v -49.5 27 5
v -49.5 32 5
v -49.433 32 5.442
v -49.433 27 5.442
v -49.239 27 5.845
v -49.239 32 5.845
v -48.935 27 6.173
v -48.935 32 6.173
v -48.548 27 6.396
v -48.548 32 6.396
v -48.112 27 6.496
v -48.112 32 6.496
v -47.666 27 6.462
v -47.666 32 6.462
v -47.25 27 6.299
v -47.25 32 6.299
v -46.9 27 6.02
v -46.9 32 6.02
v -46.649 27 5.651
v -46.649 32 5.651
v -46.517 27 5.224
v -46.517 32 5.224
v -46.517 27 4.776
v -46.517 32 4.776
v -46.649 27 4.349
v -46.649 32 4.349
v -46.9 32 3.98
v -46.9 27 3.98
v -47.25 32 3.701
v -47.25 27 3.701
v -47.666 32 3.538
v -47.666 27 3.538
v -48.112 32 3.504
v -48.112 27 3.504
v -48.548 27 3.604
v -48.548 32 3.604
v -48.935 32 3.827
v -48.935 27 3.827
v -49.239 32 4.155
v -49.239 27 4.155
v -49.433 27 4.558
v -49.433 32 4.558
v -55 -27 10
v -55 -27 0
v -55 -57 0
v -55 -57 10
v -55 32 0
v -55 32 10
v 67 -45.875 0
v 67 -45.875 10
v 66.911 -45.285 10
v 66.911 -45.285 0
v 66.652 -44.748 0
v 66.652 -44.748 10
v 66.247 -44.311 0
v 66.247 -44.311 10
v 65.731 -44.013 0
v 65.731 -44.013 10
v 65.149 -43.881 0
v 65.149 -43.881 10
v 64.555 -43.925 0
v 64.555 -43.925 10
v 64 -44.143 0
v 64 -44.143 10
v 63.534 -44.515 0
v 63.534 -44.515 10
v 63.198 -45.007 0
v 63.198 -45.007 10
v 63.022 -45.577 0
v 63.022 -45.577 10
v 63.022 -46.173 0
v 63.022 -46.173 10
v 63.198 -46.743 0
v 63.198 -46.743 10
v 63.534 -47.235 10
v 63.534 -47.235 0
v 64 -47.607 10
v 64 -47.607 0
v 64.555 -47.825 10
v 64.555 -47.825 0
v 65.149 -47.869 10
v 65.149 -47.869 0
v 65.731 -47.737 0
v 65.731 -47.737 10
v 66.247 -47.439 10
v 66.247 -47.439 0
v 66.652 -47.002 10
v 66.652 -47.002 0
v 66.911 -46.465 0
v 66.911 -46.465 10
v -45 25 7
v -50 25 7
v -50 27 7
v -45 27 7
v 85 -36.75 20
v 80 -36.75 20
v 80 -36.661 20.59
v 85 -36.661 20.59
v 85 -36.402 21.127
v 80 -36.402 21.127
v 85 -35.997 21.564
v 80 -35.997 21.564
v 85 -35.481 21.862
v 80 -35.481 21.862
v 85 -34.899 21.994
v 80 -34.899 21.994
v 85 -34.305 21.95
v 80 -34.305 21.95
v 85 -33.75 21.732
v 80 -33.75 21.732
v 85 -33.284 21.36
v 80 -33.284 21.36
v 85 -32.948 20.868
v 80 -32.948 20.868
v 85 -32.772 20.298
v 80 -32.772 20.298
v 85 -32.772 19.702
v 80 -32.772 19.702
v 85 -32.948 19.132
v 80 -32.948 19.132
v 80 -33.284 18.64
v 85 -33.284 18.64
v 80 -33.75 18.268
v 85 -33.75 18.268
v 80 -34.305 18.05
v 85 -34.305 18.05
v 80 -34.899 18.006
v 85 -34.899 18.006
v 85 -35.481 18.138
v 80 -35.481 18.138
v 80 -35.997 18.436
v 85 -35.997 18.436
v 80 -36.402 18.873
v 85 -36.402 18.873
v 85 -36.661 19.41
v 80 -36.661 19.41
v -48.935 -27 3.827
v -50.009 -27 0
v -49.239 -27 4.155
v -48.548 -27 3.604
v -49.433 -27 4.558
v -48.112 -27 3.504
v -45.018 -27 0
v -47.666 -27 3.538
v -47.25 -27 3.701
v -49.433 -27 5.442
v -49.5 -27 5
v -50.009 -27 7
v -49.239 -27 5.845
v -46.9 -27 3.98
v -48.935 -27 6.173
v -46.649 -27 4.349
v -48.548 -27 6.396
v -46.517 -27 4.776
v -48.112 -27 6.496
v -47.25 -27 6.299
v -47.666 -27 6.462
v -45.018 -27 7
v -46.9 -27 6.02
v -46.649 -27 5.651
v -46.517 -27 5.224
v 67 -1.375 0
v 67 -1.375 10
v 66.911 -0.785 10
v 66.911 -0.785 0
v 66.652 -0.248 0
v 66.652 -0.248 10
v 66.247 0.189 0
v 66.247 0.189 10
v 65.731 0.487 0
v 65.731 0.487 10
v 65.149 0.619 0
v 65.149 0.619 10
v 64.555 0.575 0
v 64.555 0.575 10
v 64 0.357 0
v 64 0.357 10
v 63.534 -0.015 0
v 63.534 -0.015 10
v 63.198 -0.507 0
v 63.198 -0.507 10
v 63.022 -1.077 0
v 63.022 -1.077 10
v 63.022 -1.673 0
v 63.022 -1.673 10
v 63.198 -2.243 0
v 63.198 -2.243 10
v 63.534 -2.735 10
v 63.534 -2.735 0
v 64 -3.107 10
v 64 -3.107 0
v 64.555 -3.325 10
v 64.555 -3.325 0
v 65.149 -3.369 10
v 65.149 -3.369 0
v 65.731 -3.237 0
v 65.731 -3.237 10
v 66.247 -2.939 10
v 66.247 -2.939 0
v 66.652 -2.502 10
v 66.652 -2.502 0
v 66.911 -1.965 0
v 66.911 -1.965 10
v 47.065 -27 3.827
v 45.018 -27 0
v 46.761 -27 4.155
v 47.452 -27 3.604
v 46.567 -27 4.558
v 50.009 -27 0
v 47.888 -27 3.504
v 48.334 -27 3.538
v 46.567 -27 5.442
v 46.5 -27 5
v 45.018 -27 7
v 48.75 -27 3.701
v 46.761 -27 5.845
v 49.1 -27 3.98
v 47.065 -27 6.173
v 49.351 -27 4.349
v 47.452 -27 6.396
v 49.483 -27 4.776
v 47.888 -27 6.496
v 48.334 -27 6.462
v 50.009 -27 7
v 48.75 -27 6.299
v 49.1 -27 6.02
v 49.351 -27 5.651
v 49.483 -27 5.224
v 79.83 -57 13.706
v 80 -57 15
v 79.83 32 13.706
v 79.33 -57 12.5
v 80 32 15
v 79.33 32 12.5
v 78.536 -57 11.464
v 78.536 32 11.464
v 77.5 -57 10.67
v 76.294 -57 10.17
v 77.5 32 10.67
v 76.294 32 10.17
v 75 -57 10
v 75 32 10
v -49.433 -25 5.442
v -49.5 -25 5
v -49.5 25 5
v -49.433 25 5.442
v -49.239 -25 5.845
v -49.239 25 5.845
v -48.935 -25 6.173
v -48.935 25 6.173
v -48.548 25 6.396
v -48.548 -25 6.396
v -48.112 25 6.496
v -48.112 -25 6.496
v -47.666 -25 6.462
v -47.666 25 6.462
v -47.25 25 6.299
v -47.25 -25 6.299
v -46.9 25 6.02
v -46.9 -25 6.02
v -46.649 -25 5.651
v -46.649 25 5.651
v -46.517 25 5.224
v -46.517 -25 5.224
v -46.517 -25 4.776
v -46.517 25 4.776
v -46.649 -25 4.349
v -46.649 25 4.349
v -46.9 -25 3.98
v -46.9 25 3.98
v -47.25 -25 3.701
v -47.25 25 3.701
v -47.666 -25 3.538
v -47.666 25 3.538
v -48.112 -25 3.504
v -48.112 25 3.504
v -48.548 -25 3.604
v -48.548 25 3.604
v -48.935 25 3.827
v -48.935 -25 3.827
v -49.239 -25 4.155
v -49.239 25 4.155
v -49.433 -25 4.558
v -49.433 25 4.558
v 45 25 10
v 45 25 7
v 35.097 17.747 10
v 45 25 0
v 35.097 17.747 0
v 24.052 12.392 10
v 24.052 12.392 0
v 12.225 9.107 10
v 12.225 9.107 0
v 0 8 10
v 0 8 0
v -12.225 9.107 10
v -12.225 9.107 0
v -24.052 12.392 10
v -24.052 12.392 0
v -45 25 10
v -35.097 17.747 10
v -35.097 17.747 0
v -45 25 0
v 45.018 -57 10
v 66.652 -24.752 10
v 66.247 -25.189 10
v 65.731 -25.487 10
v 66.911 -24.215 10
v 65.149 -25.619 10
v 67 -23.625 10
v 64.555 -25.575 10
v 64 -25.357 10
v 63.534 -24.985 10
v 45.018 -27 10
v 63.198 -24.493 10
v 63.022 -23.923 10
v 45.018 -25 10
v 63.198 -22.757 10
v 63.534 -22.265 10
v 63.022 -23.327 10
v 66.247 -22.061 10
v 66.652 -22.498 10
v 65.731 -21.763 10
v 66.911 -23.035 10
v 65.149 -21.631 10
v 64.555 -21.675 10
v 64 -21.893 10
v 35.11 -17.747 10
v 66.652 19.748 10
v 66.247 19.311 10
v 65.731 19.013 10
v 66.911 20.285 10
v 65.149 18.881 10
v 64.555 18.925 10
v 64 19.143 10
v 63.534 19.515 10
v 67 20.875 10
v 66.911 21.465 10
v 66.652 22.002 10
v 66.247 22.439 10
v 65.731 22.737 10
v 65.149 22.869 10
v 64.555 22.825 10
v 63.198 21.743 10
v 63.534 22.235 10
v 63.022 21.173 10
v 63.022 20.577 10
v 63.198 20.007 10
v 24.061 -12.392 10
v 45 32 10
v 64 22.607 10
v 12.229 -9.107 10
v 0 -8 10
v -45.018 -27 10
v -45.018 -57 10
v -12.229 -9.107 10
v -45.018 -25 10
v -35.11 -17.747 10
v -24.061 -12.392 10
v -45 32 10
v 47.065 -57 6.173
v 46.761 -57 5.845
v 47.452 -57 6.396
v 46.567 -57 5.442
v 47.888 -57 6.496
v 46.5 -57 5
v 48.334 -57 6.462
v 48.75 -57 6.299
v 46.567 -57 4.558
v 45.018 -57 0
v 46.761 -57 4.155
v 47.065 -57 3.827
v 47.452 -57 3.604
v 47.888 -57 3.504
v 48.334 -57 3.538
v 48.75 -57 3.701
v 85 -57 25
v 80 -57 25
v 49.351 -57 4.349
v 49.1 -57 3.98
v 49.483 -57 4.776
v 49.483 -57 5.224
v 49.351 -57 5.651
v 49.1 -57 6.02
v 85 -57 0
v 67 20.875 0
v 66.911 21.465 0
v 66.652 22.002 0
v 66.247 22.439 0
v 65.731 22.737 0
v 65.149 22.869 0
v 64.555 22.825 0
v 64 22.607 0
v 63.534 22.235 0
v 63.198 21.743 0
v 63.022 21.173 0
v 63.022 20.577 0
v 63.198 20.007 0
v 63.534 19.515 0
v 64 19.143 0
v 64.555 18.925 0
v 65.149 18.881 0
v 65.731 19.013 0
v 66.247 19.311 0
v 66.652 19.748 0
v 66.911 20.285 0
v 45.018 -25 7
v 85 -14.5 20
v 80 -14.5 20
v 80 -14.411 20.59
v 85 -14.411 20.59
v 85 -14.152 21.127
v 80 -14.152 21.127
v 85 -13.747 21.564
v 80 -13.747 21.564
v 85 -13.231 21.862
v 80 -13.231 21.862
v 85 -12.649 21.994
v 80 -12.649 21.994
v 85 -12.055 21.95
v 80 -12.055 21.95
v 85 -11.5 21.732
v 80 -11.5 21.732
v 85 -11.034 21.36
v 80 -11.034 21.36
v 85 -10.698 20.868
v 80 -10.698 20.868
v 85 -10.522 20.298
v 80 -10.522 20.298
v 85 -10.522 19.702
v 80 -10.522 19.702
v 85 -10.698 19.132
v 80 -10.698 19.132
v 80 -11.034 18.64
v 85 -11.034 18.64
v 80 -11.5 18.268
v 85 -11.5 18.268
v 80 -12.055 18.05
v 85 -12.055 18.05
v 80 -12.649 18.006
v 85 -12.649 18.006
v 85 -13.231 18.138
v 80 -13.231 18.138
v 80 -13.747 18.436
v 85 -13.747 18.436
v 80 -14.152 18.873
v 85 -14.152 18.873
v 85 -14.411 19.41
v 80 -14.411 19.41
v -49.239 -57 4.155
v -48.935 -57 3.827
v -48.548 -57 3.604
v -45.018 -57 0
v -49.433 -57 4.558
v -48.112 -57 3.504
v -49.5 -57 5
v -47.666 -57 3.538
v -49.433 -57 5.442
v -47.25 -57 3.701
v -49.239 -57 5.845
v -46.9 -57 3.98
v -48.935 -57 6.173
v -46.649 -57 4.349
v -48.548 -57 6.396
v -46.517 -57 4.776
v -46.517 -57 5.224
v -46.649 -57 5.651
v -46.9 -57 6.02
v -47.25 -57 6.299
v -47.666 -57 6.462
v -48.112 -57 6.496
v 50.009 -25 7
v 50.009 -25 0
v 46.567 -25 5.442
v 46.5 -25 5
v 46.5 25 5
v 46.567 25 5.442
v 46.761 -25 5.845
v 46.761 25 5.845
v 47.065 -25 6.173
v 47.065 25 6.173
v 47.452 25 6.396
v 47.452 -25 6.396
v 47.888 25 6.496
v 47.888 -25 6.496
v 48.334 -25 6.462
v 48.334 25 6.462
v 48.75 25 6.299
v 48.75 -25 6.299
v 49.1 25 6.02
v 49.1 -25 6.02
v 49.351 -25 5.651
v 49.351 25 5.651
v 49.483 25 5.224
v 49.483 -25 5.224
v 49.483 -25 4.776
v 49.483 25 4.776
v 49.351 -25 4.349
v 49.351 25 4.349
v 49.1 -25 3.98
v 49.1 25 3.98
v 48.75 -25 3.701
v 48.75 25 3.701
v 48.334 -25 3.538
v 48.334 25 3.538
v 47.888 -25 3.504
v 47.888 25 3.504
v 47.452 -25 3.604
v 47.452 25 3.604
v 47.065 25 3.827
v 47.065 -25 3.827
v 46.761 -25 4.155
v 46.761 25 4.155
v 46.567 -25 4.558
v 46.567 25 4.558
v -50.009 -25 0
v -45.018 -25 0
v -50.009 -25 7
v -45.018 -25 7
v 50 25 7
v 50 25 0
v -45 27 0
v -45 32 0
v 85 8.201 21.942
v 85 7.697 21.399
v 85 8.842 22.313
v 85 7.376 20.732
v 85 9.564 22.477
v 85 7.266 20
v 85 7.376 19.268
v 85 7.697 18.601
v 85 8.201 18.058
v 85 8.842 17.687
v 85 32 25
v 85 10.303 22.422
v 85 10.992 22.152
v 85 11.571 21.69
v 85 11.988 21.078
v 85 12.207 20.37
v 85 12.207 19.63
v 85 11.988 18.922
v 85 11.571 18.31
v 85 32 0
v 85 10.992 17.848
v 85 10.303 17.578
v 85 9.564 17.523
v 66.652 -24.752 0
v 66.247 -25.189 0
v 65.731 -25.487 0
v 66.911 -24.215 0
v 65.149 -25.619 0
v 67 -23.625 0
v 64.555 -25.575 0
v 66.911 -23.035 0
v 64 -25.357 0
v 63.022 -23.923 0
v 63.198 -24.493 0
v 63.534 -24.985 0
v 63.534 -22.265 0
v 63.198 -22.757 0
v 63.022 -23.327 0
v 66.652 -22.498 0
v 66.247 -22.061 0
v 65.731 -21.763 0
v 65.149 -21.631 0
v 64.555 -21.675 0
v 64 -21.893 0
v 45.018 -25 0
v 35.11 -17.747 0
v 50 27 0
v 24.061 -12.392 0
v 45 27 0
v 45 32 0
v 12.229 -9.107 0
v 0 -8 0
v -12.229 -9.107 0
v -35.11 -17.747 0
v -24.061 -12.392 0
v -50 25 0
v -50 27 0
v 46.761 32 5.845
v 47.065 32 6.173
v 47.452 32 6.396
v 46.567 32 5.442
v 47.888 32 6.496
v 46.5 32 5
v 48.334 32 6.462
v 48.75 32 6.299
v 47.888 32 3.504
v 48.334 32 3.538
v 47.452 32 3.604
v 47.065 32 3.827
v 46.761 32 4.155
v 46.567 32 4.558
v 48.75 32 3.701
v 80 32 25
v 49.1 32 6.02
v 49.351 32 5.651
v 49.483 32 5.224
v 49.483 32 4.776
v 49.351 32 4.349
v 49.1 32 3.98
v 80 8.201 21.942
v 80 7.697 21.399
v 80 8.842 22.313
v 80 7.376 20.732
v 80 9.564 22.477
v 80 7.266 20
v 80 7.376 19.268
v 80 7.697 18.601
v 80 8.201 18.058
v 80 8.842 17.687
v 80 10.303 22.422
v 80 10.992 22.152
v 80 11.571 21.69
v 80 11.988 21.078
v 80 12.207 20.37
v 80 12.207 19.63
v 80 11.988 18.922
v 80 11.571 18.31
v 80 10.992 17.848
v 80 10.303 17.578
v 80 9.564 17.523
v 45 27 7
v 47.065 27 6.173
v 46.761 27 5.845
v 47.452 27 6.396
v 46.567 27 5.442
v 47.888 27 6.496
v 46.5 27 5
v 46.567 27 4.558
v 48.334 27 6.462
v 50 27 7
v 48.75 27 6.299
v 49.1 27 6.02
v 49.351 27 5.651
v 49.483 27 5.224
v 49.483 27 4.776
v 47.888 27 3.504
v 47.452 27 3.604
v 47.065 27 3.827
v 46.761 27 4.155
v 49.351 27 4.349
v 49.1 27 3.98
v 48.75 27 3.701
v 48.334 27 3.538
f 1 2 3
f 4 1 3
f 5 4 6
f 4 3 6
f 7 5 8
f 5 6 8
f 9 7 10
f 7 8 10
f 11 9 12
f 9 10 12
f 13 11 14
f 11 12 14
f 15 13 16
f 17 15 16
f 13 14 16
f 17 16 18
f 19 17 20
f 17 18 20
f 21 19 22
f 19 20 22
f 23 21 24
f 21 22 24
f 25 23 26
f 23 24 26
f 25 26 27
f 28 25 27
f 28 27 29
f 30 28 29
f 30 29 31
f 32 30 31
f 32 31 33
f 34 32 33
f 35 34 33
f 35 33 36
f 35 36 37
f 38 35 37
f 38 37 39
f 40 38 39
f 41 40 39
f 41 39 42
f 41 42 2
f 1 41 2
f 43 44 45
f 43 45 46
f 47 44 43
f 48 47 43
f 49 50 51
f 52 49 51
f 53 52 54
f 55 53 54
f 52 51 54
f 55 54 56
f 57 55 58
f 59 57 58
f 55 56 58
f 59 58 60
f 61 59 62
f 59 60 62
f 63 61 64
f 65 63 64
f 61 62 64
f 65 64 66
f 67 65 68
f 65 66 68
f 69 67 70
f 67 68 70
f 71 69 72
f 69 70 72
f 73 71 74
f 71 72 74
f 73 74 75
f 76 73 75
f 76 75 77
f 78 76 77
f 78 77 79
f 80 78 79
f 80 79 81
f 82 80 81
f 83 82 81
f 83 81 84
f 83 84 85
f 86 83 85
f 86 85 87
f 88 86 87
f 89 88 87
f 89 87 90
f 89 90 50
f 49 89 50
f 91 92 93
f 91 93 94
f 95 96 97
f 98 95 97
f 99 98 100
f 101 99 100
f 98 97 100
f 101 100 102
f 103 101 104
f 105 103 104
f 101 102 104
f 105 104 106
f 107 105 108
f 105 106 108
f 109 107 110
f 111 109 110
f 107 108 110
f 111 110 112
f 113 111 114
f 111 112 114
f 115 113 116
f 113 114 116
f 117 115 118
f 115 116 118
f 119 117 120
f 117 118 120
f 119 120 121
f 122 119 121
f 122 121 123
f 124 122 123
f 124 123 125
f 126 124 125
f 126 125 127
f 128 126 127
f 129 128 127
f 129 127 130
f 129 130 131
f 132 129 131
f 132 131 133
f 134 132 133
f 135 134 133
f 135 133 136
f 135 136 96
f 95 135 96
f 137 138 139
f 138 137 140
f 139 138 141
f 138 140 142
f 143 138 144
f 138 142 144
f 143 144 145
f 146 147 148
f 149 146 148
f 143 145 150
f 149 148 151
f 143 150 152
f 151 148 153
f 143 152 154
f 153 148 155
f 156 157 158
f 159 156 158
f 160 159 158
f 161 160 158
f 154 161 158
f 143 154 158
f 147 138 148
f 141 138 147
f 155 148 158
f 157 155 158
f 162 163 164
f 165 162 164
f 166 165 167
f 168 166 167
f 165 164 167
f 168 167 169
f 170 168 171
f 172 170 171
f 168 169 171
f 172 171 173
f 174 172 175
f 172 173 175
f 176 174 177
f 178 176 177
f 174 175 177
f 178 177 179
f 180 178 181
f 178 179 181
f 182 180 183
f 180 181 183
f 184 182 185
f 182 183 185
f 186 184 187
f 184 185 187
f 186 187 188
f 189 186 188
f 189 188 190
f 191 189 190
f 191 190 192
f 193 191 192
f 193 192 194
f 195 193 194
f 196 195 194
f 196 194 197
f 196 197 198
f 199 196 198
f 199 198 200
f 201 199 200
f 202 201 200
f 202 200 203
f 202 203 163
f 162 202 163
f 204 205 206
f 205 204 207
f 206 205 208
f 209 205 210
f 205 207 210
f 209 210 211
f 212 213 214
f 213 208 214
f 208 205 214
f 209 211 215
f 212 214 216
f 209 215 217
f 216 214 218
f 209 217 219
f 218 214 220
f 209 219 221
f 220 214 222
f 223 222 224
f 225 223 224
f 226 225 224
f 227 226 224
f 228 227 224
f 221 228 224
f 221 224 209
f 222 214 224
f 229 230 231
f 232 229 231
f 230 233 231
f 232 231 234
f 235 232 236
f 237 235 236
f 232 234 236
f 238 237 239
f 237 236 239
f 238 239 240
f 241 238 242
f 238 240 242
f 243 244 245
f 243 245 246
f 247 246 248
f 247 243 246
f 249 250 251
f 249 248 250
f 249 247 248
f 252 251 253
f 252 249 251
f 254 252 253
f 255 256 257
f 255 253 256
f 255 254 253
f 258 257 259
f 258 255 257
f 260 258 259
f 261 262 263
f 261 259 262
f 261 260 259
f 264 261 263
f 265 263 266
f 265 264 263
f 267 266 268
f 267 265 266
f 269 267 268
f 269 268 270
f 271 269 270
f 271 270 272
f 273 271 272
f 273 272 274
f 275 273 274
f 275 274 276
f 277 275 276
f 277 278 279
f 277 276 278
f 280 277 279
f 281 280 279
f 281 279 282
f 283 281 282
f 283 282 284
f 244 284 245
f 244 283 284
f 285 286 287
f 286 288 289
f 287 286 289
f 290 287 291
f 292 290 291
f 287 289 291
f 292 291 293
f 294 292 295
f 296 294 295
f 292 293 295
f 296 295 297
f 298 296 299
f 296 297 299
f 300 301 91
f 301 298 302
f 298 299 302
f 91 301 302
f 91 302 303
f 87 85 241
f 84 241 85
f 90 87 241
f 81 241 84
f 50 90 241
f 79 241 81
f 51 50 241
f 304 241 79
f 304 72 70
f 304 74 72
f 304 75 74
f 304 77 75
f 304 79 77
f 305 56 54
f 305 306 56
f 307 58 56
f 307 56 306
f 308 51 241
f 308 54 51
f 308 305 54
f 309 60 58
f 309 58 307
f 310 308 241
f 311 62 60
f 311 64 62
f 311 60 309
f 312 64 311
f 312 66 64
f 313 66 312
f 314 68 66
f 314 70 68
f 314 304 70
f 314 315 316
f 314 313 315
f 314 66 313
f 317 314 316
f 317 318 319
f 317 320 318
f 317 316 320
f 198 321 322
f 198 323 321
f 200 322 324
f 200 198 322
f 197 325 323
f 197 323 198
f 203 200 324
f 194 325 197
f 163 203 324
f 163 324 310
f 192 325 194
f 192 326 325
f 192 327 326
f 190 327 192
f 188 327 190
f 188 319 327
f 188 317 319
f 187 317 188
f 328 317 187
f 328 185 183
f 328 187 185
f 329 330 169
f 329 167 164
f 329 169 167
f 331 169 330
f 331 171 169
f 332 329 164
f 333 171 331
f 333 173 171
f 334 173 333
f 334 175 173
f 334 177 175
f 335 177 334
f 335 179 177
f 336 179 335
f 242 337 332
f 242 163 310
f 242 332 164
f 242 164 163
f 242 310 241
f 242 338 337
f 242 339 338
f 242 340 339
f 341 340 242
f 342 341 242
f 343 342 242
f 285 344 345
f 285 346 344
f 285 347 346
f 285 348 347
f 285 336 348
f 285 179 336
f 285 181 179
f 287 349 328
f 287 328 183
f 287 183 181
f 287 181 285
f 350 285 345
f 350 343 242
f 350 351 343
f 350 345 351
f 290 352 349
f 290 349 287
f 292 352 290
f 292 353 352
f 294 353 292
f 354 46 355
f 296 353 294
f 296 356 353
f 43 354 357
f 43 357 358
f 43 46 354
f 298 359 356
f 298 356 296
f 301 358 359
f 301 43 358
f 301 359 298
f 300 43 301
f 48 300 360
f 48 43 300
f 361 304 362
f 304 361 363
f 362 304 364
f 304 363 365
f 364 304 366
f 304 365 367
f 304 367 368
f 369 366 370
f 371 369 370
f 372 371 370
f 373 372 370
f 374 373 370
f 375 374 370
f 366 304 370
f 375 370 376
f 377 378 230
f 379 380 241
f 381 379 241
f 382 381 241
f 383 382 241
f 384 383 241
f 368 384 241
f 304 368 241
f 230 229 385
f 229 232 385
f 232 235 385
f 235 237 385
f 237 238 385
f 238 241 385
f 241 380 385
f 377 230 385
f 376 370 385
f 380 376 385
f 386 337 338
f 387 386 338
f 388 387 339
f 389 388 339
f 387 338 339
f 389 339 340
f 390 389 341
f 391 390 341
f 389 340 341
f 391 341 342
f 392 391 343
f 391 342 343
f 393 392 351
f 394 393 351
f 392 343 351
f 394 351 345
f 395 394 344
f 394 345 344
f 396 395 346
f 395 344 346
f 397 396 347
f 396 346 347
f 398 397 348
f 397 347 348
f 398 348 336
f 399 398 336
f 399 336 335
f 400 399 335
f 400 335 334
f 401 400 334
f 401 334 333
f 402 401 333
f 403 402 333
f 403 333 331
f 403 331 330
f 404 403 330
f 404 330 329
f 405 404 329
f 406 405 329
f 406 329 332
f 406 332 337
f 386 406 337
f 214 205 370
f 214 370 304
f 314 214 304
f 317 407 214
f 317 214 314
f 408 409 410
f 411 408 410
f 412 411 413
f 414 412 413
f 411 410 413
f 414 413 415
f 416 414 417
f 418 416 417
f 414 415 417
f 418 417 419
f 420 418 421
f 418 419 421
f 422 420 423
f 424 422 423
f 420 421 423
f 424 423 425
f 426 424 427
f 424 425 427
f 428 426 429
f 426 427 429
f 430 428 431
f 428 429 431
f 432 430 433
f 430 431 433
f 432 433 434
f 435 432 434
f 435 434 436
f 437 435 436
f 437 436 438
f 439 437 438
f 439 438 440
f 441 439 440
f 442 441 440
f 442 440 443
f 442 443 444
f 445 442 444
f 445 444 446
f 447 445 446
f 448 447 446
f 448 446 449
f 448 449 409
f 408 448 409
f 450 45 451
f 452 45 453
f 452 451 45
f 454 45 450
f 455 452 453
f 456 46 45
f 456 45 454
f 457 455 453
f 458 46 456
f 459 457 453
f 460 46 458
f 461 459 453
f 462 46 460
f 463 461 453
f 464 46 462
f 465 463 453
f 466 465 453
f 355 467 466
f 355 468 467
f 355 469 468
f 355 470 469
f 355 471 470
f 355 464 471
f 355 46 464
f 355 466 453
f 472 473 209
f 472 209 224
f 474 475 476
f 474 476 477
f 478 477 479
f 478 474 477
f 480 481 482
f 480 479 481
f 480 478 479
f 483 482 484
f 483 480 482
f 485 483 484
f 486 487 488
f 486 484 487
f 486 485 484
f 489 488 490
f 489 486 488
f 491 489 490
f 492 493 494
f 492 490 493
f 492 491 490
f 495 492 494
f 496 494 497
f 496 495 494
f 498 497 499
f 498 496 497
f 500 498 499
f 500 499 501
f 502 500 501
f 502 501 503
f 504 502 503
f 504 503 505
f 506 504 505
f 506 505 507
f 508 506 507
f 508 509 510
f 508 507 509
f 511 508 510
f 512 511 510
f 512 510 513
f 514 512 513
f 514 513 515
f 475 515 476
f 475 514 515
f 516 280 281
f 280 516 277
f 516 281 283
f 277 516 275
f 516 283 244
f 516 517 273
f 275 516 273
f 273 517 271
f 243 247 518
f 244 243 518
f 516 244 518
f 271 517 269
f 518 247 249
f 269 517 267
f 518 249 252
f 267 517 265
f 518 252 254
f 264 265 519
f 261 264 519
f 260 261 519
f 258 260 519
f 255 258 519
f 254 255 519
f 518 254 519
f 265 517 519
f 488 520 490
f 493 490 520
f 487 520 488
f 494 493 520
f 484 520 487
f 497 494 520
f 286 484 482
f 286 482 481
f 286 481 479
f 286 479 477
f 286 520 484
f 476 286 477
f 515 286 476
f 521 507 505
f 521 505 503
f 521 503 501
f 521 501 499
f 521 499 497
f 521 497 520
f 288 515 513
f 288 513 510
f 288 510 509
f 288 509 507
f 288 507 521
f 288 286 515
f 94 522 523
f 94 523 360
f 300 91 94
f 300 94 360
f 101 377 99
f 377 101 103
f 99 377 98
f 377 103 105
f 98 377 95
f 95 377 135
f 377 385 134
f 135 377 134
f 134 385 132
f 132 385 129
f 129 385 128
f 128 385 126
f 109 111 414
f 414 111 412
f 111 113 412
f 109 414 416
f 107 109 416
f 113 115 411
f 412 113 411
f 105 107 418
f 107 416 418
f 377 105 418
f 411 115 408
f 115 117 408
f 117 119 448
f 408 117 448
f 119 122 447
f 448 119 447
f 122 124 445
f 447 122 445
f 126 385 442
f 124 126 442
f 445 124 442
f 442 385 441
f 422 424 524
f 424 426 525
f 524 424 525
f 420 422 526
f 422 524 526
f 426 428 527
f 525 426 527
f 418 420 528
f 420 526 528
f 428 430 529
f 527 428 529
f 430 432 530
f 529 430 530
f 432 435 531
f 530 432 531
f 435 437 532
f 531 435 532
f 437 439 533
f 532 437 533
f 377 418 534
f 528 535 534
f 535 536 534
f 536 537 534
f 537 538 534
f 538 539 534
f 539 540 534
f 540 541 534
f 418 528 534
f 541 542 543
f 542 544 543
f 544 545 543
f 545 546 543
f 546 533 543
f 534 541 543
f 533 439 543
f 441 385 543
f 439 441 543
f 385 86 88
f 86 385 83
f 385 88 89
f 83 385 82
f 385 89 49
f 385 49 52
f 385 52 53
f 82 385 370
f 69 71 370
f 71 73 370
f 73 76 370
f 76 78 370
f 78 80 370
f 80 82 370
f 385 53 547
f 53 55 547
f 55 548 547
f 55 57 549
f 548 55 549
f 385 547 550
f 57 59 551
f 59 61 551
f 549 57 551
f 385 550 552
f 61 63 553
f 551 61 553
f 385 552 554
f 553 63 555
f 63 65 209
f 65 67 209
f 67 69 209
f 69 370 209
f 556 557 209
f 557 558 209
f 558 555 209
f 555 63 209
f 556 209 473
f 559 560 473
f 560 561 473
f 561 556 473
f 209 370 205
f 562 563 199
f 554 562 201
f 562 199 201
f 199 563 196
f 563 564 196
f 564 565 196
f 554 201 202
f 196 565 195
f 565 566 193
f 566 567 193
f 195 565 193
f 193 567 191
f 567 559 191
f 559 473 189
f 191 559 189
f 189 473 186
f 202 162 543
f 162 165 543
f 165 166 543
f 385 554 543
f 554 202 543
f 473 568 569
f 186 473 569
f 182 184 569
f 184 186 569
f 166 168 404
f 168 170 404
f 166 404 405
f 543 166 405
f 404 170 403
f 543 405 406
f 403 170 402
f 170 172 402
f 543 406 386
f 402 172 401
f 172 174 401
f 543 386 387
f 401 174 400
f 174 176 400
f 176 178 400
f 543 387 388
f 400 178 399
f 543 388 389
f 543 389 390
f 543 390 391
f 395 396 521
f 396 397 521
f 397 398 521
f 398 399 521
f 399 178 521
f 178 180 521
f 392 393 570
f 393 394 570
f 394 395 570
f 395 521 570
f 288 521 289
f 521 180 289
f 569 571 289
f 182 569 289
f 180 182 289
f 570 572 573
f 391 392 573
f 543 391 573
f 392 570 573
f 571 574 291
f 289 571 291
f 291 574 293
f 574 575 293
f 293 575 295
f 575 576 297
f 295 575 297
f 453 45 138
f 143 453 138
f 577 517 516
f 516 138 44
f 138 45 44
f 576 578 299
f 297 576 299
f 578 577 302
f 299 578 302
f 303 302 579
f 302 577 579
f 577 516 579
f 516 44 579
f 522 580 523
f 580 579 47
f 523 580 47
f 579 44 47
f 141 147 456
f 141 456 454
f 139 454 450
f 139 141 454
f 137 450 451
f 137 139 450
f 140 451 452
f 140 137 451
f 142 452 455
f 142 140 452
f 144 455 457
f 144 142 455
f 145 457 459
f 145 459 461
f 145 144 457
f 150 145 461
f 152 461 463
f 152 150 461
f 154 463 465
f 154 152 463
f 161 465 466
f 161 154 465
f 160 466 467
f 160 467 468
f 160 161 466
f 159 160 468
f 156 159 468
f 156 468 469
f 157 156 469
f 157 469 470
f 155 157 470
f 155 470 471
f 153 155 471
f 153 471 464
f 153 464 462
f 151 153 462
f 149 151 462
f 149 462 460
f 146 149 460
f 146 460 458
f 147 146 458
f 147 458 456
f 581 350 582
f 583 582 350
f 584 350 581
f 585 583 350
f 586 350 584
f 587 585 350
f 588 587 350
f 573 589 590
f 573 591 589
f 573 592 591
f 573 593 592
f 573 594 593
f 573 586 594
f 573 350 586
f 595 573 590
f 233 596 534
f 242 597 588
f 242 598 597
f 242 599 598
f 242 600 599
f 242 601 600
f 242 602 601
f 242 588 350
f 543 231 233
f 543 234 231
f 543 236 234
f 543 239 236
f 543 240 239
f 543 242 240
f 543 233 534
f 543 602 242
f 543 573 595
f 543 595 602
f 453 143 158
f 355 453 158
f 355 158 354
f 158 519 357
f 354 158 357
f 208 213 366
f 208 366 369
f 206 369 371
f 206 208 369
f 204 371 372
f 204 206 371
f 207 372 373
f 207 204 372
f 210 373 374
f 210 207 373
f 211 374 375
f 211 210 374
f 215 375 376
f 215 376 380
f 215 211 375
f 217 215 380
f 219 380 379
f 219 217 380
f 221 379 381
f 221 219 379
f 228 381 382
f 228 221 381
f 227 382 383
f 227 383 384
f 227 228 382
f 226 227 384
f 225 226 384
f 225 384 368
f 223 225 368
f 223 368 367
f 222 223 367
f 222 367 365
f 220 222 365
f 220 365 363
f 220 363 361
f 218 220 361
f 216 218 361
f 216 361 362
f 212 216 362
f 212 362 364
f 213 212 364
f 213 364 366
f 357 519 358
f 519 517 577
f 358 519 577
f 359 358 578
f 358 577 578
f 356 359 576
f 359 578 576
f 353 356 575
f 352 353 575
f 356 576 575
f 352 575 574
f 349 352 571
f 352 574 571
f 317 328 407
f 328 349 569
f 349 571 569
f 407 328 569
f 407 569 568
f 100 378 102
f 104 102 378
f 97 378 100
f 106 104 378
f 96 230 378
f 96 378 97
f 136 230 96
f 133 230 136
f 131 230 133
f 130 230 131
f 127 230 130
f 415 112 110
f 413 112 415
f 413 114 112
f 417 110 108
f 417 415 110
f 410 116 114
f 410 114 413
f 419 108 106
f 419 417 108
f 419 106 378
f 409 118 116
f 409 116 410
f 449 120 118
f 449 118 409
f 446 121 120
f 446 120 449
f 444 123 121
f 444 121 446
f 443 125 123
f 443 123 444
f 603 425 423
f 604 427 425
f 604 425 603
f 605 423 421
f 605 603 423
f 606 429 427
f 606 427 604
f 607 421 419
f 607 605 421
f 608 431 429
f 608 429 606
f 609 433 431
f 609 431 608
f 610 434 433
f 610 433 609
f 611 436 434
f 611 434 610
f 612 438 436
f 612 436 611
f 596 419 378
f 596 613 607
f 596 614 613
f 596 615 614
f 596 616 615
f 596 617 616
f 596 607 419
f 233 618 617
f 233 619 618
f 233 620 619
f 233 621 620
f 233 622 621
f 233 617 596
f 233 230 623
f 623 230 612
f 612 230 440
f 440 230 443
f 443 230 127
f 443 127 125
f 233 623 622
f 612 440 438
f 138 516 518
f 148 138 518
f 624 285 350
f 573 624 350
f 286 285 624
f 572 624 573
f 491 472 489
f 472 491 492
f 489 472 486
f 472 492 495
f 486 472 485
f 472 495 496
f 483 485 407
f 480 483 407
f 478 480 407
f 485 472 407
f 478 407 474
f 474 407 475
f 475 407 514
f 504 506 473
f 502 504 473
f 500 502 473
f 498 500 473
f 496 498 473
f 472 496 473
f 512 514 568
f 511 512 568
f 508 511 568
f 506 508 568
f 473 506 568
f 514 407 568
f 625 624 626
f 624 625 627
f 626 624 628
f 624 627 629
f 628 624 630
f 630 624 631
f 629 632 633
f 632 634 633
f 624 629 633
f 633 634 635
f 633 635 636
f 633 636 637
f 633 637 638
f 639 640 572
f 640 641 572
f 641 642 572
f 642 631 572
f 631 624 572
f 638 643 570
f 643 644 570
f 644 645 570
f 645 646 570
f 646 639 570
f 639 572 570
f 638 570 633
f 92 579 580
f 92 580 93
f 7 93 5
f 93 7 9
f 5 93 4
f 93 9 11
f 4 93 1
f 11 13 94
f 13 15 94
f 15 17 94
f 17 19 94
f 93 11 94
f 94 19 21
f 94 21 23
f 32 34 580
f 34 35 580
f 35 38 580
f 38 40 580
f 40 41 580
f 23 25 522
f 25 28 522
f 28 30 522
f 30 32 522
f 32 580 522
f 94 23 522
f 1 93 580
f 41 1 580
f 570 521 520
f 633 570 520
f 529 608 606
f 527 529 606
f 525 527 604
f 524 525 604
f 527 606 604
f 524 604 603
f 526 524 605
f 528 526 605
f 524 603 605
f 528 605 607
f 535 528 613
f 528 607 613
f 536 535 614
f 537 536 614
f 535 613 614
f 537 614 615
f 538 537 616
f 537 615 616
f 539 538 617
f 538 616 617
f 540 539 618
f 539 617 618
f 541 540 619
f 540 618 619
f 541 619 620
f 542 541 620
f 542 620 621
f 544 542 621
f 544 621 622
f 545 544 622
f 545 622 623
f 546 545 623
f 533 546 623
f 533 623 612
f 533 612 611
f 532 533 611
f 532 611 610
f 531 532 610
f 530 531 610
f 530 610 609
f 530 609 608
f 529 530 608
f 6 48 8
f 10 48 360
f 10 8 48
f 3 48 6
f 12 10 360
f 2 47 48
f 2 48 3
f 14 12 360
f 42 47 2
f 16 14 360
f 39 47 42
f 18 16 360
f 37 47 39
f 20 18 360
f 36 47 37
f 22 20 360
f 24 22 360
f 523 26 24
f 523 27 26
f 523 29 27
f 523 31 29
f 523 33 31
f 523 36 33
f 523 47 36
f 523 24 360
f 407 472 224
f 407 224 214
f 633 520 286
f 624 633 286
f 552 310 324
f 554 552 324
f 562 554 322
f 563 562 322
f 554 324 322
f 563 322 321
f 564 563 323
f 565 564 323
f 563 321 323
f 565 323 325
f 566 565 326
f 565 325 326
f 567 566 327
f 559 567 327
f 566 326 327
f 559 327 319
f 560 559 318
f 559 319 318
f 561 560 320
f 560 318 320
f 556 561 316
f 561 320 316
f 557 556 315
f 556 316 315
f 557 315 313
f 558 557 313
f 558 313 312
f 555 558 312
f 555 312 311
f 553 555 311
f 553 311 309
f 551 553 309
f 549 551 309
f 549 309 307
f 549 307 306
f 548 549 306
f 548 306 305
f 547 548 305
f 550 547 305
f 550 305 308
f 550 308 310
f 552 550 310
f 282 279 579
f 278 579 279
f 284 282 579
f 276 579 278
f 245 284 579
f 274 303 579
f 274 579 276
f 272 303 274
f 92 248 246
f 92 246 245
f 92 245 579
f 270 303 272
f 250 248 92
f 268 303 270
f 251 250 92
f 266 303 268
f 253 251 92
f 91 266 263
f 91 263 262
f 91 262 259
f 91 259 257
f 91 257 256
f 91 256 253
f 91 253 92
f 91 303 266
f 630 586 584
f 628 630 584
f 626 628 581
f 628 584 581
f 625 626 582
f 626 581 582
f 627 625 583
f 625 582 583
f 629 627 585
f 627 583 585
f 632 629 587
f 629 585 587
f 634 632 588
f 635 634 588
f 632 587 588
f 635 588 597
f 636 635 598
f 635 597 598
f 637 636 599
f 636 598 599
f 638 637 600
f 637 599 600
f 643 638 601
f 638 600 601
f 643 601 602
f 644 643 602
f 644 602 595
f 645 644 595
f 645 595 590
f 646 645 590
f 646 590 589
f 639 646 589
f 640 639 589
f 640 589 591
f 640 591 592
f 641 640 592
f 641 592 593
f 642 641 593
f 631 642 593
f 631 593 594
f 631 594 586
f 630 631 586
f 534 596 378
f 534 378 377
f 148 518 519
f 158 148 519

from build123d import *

# Parameters (mm, degrees)
BOSS_EXTRUDE1_DEPTH     = 10
CUT_EXTRUDE1_DEPTH      = 72.414284285
CUT_EXTRUDE1_DEPTH_BACK = 72.414284285
SKETCH2_R               = 1.5
SKETCH9_W               = 10
SKETCH9_H               = 50
BOSS_EXTRUDE9_DEPTH     = 5
SKETCH10_W              = 10
SKETCH10_H              = 50
BOSS_EXTRUDE10_DEPTH    = 5
BOSS_EXTRUDE11_DEPTH    = 2
SKETCH12_W              = 10
SKETCH12_H              = 10
BOSS_EXTRUDE12_DEPTH    = 5
CUT_EXTRUDE2_START      = 7
SKETCH13_R              = 1.5
CUT_EXTRUDE2_DEPTH      = 7
BOSS_EXTRUDE13_DEPTH    = 2
SKETCH15_W              = 9.981523119
SKETCH15_H              = 10
BOSS_EXTRUDE14_DEPTH    = 30
SKETCH16_R              = 1.5
CUT_EXTRUDE3_DEPTH      = 32
SKETCH18_W              = 10
SKETCH18_H              = 89
BOSS_EXTRUDE15_DEPTH    = 30
SKETCH19_W              = 5
SKETCH19_H              = 89
BOSS_EXTRUDE16_DEPTH    = 15
FILLET1_R               = 5
SKETCH20_R              = 2.48436703
SKETCH20_R_2            = 2
CUT_EXTRUDE4_DEPTH      = 149.657324071
SKETCH22_R              = 2
CUT_EXTRUDE5_DEPTH      = 104.435970532


with BuildPart() as part:
    # Sketch1 → Boss-Extrude1 (new body)
    with BuildSketch(Plane.XY):
        with BuildLine():
            Line((45.018476881, -25), (50, -25))
            Line((50, -25), (50, 25))
            Line((50, 25), (45, 25))
            ThreePointArc((45, 25), (0, 8), (-45, 25))
            Line((-45, 25), (-50, 25))
            Line((-50, 25), (-50, -25))
            Line((-50, -25), (-45.018476881, -25))
            ThreePointArc((-45.018476881, -25), (0, -8), (45.018476881, -25))
        make_face()
    extrude(amount=BOSS_EXTRUDE1_DEPTH)

    # Sketch2 → Cut-Extrude1 (cut, two sides: drawn at the far end of the back side and taken through both)
    with BuildSketch(Plane(origin=(0, 25, 0), x_dir=(1, 0, 0), z_dir=(0, 1, 0)).offset(-CUT_EXTRUDE1_DEPTH_BACK)):
        with Locations(Location((-48, -5, 0), (0, 0, 180))):
            Circle(SKETCH2_R)
        with Locations(Location((48, -5, 0), (0, 0, 180))):
            Circle(SKETCH2_R)
    extrude(amount=CUT_EXTRUDE1_DEPTH + CUT_EXTRUDE1_DEPTH_BACK, mode=Mode.SUBTRACT)

    # Sketch9 → Boss-Extrude9 (add)
    with BuildSketch(Plane(origin=(50, 0, 0), x_dir=(0, 0, -1), z_dir=(1, 0, 0))):
        with Locations((-5, 0)):
            Rectangle(SKETCH9_W, SKETCH9_H)
    extrude(amount=BOSS_EXTRUDE9_DEPTH)

    # Sketch10 → Boss-Extrude10 (add)
    with BuildSketch(Plane.ZY.offset(50)):
        with Locations((5, 0)):
            Rectangle(SKETCH10_W, SKETCH10_H)
    extrude(amount=BOSS_EXTRUDE10_DEPTH)

    # Sketch11 → Boss-Extrude11 (add)
    with BuildSketch(Plane(origin=(0, 25, 0), x_dir=(1, 0, 0), z_dir=(0, 1, 0))):
        Polygon((50, 0), (50, -7), (45, -7), (45, -10), (55, -10), (55, 0), align=None)
        Polygon((-50, 0), (-50, -7), (-45, -7), (-45, -10), (-55, -10), (-55, 0), align=None)
    extrude(amount=BOSS_EXTRUDE11_DEPTH)

    # Sketch12 → Boss-Extrude12 (add)
    with BuildSketch(Plane(origin=(0, 27, 0), x_dir=(1, 0, 0), z_dir=(0, 1, 0))):
        with Locations((50, -5)):
            Rectangle(SKETCH12_W, SKETCH12_H)
        with Locations((-50, -5)):
            Rectangle(SKETCH12_W, SKETCH12_H)
    extrude(amount=BOSS_EXTRUDE12_DEPTH)

    # Sketch13 → Cut-Extrude2 (cut)
    with BuildSketch(Plane(origin=(0, 25, 0), x_dir=(1, 0, 0), z_dir=(0, 1, 0)).offset(CUT_EXTRUDE2_START)):
        with Locations(Location((48, -5, 0), (0, 0, 180))):
            Circle(SKETCH13_R)
        with Locations(Location((-48, -5, 0), (0, 0, 180))):
            Circle(SKETCH13_R)
    extrude(amount=-CUT_EXTRUDE2_DEPTH, mode=Mode.SUBTRACT)

    # Sketch14 → Boss-Extrude13 (add)
    with BuildSketch(Plane.XZ.offset(25)):
        Polygon((50.009238441, 0), (50.009238441, 7), (45.018476881, 7), (45.018476881, 10), (55, 10), (55, 0), align=None)
        Polygon((-50.009238441, 0), (-50.009238441, 7), (-45.018476881, 7), (-45.018476881, 10), (-55, 10), (-55, 0), align=None)
    extrude(amount=BOSS_EXTRUDE13_DEPTH)

    # Sketch15 → Boss-Extrude14 (add)
    with BuildSketch(Plane.XZ.offset(27)):
        with Locations((-50.00923844, 5)):
            Rectangle(SKETCH15_W, SKETCH15_H)
        with Locations((50.00923844, 5)):
            Rectangle(SKETCH15_W, SKETCH15_H)
    extrude(amount=BOSS_EXTRUDE14_DEPTH)

    # Sketch16 → Cut-Extrude3 (cut)
    with BuildSketch(Plane.XZ.offset(25)):
        with Locations(Location((48, 5, 0), (0, 0, 180))):
            Circle(SKETCH16_R)
        with Locations(Location((-48, 5, 0), (0, 0, 180))):
            Circle(SKETCH16_R)
    extrude(amount=CUT_EXTRUDE3_DEPTH, mode=Mode.SUBTRACT)

    # Sketch18 → Boss-Extrude15 (add)
    with BuildSketch(Plane(origin=(55, 0, 0), x_dir=(0, 0, -1), z_dir=(1, 0, 0))):
        with Locations((-5, -12.5)):
            Rectangle(SKETCH18_W, SKETCH18_H)
    extrude(amount=BOSS_EXTRUDE15_DEPTH)

    # Sketch19 → Boss-Extrude16 (add)
    with BuildSketch(Plane.XY.offset(10)):
        with Locations((82.5, -12.5)):
            Rectangle(SKETCH19_W, SKETCH19_H)
    extrude(amount=BOSS_EXTRUDE16_DEPTH)

    # Fillet1
    fillet1_edges = [part.edges().sort_by_distance(p)[0] for p in [
        (80, -12.5, 10),
    ]]
    fillet(fillet1_edges, radius=FILLET1_R)

    # Sketch20 → Cut-Extrude4 (cut, through all)
    with BuildSketch(Plane.ZY.offset(-80)):
        with Locations(Location((20, 9.75, 0), (0, 0, 270))):
            Circle(SKETCH20_R)
        with Locations(Location((20, -12.5, 0), (0, 0, 270))):
            Circle(SKETCH20_R_2)
        with Locations(Location((20, -34.75, 0), (0, 0, 270))):
            Circle(SKETCH20_R_2)
    extrude(amount=-CUT_EXTRUDE4_DEPTH, mode=Mode.SUBTRACT)

    # Sketch22 → Cut-Extrude5 (cut, through all)
    with BuildSketch(Plane.XY.offset(10)):
        with Locations((65, 20.875)):
            Circle(SKETCH22_R)
        with Locations((65, -1.375)):
            Circle(SKETCH22_R)
        with Locations((65, -23.625)):
            Circle(SKETCH22_R)
        with Locations((65, -45.875)):
            Circle(SKETCH22_R)
    extrude(amount=-CUT_EXTRUDE5_DEPTH, mode=Mode.SUBTRACT)


solid = part.part
